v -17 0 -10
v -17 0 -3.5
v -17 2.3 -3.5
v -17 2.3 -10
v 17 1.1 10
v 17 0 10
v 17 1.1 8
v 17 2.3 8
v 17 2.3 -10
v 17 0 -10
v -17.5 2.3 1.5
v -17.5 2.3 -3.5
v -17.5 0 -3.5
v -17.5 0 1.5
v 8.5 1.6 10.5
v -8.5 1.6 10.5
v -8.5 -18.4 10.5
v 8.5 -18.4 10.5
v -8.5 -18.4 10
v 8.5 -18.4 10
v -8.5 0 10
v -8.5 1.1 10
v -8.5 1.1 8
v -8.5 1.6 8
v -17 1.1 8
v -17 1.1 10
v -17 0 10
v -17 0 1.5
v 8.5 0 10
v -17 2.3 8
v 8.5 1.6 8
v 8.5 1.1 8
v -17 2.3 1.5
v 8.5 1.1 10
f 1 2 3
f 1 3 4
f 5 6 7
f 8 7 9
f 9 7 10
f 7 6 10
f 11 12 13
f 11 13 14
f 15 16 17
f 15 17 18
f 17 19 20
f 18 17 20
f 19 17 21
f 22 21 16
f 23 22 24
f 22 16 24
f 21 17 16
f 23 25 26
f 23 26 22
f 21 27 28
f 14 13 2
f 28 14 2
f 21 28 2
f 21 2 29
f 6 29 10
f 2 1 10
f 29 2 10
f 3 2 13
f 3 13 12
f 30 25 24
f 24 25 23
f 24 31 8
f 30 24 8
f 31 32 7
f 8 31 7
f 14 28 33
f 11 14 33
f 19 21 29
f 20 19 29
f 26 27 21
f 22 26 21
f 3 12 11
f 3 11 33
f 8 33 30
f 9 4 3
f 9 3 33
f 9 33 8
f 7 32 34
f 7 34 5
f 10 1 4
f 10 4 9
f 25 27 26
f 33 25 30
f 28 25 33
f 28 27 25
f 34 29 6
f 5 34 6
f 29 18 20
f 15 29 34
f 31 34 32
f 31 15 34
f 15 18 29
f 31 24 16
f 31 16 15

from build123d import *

# Parameters (mm, degrees)
SKETCH1_W           = 34
SKETCH1_H           = 20
BOSS_EXTRUDE1_DEPTH = 1.1
SKETCH3_W           = 34
SKETCH3_H           = 18
BOSS_EXTRUDE2_DEPTH = 1.2
SKETCH4_W           = 5
SKETCH4_H           = 2.3
BOSS_EXTRUDE3_DEPTH = 0.5
SKETCH5_W           = 17
SKETCH5_H           = 2
BOSS_EXTRUDE4_DEPTH = 0.5
SKETCH6_W           = 17
SKETCH6_H           = 0.5
BOSS_EXTRUDE5_DEPTH = 20


with BuildPart() as part:
    # Sketch1 → Boss-Extrude1 (new body)
    with BuildSketch(Plane(origin=(0, 0, 0), x_dir=(1, 0, 0), z_dir=(0, 1, 0))):
        Rectangle(SKETCH1_W, SKETCH1_H)
    extrude(amount=BOSS_EXTRUDE1_DEPTH)

    # Sketch3 → Boss-Extrude2 (add)
    with BuildSketch(Plane(origin=(0, 1.1, 0), x_dir=(1, 0, 0), z_dir=(0, 1, 0))):
        with Locations((0, 1)):
            Rectangle(SKETCH3_W, SKETCH3_H)
    extrude(amount=BOSS_EXTRUDE2_DEPTH)

    # Sketch4 → Boss-Extrude3 (add)
    with BuildSketch(Plane.ZY.offset(17)):
        with Locations((-1, 1.15)):
            Rectangle(SKETCH4_W, SKETCH4_H)
    extrude(amount=BOSS_EXTRUDE3_DEPTH)

    # Sketch5 → Boss-Extrude4 (add)
    with BuildSketch(Plane(origin=(0, 1.1, 0), x_dir=(1, 0, 0), z_dir=(0, 1, 0))):
        with Locations((0, -9)):
            Rectangle(SKETCH5_W, SKETCH5_H)
    extrude(amount=BOSS_EXTRUDE4_DEPTH)

    # Sketch6 → Boss-Extrude5 (add)
    with BuildSketch(Plane(origin=(0, 1.6, 0), x_dir=(1, 0, 0), z_dir=(0, 1, 0))):
        with Locations((0, -10.25)):
            Rectangle(SKETCH6_W, SKETCH6_H)
    extrude(amount=-BOSS_EXTRUDE5_DEPTH)


solid = part.part
